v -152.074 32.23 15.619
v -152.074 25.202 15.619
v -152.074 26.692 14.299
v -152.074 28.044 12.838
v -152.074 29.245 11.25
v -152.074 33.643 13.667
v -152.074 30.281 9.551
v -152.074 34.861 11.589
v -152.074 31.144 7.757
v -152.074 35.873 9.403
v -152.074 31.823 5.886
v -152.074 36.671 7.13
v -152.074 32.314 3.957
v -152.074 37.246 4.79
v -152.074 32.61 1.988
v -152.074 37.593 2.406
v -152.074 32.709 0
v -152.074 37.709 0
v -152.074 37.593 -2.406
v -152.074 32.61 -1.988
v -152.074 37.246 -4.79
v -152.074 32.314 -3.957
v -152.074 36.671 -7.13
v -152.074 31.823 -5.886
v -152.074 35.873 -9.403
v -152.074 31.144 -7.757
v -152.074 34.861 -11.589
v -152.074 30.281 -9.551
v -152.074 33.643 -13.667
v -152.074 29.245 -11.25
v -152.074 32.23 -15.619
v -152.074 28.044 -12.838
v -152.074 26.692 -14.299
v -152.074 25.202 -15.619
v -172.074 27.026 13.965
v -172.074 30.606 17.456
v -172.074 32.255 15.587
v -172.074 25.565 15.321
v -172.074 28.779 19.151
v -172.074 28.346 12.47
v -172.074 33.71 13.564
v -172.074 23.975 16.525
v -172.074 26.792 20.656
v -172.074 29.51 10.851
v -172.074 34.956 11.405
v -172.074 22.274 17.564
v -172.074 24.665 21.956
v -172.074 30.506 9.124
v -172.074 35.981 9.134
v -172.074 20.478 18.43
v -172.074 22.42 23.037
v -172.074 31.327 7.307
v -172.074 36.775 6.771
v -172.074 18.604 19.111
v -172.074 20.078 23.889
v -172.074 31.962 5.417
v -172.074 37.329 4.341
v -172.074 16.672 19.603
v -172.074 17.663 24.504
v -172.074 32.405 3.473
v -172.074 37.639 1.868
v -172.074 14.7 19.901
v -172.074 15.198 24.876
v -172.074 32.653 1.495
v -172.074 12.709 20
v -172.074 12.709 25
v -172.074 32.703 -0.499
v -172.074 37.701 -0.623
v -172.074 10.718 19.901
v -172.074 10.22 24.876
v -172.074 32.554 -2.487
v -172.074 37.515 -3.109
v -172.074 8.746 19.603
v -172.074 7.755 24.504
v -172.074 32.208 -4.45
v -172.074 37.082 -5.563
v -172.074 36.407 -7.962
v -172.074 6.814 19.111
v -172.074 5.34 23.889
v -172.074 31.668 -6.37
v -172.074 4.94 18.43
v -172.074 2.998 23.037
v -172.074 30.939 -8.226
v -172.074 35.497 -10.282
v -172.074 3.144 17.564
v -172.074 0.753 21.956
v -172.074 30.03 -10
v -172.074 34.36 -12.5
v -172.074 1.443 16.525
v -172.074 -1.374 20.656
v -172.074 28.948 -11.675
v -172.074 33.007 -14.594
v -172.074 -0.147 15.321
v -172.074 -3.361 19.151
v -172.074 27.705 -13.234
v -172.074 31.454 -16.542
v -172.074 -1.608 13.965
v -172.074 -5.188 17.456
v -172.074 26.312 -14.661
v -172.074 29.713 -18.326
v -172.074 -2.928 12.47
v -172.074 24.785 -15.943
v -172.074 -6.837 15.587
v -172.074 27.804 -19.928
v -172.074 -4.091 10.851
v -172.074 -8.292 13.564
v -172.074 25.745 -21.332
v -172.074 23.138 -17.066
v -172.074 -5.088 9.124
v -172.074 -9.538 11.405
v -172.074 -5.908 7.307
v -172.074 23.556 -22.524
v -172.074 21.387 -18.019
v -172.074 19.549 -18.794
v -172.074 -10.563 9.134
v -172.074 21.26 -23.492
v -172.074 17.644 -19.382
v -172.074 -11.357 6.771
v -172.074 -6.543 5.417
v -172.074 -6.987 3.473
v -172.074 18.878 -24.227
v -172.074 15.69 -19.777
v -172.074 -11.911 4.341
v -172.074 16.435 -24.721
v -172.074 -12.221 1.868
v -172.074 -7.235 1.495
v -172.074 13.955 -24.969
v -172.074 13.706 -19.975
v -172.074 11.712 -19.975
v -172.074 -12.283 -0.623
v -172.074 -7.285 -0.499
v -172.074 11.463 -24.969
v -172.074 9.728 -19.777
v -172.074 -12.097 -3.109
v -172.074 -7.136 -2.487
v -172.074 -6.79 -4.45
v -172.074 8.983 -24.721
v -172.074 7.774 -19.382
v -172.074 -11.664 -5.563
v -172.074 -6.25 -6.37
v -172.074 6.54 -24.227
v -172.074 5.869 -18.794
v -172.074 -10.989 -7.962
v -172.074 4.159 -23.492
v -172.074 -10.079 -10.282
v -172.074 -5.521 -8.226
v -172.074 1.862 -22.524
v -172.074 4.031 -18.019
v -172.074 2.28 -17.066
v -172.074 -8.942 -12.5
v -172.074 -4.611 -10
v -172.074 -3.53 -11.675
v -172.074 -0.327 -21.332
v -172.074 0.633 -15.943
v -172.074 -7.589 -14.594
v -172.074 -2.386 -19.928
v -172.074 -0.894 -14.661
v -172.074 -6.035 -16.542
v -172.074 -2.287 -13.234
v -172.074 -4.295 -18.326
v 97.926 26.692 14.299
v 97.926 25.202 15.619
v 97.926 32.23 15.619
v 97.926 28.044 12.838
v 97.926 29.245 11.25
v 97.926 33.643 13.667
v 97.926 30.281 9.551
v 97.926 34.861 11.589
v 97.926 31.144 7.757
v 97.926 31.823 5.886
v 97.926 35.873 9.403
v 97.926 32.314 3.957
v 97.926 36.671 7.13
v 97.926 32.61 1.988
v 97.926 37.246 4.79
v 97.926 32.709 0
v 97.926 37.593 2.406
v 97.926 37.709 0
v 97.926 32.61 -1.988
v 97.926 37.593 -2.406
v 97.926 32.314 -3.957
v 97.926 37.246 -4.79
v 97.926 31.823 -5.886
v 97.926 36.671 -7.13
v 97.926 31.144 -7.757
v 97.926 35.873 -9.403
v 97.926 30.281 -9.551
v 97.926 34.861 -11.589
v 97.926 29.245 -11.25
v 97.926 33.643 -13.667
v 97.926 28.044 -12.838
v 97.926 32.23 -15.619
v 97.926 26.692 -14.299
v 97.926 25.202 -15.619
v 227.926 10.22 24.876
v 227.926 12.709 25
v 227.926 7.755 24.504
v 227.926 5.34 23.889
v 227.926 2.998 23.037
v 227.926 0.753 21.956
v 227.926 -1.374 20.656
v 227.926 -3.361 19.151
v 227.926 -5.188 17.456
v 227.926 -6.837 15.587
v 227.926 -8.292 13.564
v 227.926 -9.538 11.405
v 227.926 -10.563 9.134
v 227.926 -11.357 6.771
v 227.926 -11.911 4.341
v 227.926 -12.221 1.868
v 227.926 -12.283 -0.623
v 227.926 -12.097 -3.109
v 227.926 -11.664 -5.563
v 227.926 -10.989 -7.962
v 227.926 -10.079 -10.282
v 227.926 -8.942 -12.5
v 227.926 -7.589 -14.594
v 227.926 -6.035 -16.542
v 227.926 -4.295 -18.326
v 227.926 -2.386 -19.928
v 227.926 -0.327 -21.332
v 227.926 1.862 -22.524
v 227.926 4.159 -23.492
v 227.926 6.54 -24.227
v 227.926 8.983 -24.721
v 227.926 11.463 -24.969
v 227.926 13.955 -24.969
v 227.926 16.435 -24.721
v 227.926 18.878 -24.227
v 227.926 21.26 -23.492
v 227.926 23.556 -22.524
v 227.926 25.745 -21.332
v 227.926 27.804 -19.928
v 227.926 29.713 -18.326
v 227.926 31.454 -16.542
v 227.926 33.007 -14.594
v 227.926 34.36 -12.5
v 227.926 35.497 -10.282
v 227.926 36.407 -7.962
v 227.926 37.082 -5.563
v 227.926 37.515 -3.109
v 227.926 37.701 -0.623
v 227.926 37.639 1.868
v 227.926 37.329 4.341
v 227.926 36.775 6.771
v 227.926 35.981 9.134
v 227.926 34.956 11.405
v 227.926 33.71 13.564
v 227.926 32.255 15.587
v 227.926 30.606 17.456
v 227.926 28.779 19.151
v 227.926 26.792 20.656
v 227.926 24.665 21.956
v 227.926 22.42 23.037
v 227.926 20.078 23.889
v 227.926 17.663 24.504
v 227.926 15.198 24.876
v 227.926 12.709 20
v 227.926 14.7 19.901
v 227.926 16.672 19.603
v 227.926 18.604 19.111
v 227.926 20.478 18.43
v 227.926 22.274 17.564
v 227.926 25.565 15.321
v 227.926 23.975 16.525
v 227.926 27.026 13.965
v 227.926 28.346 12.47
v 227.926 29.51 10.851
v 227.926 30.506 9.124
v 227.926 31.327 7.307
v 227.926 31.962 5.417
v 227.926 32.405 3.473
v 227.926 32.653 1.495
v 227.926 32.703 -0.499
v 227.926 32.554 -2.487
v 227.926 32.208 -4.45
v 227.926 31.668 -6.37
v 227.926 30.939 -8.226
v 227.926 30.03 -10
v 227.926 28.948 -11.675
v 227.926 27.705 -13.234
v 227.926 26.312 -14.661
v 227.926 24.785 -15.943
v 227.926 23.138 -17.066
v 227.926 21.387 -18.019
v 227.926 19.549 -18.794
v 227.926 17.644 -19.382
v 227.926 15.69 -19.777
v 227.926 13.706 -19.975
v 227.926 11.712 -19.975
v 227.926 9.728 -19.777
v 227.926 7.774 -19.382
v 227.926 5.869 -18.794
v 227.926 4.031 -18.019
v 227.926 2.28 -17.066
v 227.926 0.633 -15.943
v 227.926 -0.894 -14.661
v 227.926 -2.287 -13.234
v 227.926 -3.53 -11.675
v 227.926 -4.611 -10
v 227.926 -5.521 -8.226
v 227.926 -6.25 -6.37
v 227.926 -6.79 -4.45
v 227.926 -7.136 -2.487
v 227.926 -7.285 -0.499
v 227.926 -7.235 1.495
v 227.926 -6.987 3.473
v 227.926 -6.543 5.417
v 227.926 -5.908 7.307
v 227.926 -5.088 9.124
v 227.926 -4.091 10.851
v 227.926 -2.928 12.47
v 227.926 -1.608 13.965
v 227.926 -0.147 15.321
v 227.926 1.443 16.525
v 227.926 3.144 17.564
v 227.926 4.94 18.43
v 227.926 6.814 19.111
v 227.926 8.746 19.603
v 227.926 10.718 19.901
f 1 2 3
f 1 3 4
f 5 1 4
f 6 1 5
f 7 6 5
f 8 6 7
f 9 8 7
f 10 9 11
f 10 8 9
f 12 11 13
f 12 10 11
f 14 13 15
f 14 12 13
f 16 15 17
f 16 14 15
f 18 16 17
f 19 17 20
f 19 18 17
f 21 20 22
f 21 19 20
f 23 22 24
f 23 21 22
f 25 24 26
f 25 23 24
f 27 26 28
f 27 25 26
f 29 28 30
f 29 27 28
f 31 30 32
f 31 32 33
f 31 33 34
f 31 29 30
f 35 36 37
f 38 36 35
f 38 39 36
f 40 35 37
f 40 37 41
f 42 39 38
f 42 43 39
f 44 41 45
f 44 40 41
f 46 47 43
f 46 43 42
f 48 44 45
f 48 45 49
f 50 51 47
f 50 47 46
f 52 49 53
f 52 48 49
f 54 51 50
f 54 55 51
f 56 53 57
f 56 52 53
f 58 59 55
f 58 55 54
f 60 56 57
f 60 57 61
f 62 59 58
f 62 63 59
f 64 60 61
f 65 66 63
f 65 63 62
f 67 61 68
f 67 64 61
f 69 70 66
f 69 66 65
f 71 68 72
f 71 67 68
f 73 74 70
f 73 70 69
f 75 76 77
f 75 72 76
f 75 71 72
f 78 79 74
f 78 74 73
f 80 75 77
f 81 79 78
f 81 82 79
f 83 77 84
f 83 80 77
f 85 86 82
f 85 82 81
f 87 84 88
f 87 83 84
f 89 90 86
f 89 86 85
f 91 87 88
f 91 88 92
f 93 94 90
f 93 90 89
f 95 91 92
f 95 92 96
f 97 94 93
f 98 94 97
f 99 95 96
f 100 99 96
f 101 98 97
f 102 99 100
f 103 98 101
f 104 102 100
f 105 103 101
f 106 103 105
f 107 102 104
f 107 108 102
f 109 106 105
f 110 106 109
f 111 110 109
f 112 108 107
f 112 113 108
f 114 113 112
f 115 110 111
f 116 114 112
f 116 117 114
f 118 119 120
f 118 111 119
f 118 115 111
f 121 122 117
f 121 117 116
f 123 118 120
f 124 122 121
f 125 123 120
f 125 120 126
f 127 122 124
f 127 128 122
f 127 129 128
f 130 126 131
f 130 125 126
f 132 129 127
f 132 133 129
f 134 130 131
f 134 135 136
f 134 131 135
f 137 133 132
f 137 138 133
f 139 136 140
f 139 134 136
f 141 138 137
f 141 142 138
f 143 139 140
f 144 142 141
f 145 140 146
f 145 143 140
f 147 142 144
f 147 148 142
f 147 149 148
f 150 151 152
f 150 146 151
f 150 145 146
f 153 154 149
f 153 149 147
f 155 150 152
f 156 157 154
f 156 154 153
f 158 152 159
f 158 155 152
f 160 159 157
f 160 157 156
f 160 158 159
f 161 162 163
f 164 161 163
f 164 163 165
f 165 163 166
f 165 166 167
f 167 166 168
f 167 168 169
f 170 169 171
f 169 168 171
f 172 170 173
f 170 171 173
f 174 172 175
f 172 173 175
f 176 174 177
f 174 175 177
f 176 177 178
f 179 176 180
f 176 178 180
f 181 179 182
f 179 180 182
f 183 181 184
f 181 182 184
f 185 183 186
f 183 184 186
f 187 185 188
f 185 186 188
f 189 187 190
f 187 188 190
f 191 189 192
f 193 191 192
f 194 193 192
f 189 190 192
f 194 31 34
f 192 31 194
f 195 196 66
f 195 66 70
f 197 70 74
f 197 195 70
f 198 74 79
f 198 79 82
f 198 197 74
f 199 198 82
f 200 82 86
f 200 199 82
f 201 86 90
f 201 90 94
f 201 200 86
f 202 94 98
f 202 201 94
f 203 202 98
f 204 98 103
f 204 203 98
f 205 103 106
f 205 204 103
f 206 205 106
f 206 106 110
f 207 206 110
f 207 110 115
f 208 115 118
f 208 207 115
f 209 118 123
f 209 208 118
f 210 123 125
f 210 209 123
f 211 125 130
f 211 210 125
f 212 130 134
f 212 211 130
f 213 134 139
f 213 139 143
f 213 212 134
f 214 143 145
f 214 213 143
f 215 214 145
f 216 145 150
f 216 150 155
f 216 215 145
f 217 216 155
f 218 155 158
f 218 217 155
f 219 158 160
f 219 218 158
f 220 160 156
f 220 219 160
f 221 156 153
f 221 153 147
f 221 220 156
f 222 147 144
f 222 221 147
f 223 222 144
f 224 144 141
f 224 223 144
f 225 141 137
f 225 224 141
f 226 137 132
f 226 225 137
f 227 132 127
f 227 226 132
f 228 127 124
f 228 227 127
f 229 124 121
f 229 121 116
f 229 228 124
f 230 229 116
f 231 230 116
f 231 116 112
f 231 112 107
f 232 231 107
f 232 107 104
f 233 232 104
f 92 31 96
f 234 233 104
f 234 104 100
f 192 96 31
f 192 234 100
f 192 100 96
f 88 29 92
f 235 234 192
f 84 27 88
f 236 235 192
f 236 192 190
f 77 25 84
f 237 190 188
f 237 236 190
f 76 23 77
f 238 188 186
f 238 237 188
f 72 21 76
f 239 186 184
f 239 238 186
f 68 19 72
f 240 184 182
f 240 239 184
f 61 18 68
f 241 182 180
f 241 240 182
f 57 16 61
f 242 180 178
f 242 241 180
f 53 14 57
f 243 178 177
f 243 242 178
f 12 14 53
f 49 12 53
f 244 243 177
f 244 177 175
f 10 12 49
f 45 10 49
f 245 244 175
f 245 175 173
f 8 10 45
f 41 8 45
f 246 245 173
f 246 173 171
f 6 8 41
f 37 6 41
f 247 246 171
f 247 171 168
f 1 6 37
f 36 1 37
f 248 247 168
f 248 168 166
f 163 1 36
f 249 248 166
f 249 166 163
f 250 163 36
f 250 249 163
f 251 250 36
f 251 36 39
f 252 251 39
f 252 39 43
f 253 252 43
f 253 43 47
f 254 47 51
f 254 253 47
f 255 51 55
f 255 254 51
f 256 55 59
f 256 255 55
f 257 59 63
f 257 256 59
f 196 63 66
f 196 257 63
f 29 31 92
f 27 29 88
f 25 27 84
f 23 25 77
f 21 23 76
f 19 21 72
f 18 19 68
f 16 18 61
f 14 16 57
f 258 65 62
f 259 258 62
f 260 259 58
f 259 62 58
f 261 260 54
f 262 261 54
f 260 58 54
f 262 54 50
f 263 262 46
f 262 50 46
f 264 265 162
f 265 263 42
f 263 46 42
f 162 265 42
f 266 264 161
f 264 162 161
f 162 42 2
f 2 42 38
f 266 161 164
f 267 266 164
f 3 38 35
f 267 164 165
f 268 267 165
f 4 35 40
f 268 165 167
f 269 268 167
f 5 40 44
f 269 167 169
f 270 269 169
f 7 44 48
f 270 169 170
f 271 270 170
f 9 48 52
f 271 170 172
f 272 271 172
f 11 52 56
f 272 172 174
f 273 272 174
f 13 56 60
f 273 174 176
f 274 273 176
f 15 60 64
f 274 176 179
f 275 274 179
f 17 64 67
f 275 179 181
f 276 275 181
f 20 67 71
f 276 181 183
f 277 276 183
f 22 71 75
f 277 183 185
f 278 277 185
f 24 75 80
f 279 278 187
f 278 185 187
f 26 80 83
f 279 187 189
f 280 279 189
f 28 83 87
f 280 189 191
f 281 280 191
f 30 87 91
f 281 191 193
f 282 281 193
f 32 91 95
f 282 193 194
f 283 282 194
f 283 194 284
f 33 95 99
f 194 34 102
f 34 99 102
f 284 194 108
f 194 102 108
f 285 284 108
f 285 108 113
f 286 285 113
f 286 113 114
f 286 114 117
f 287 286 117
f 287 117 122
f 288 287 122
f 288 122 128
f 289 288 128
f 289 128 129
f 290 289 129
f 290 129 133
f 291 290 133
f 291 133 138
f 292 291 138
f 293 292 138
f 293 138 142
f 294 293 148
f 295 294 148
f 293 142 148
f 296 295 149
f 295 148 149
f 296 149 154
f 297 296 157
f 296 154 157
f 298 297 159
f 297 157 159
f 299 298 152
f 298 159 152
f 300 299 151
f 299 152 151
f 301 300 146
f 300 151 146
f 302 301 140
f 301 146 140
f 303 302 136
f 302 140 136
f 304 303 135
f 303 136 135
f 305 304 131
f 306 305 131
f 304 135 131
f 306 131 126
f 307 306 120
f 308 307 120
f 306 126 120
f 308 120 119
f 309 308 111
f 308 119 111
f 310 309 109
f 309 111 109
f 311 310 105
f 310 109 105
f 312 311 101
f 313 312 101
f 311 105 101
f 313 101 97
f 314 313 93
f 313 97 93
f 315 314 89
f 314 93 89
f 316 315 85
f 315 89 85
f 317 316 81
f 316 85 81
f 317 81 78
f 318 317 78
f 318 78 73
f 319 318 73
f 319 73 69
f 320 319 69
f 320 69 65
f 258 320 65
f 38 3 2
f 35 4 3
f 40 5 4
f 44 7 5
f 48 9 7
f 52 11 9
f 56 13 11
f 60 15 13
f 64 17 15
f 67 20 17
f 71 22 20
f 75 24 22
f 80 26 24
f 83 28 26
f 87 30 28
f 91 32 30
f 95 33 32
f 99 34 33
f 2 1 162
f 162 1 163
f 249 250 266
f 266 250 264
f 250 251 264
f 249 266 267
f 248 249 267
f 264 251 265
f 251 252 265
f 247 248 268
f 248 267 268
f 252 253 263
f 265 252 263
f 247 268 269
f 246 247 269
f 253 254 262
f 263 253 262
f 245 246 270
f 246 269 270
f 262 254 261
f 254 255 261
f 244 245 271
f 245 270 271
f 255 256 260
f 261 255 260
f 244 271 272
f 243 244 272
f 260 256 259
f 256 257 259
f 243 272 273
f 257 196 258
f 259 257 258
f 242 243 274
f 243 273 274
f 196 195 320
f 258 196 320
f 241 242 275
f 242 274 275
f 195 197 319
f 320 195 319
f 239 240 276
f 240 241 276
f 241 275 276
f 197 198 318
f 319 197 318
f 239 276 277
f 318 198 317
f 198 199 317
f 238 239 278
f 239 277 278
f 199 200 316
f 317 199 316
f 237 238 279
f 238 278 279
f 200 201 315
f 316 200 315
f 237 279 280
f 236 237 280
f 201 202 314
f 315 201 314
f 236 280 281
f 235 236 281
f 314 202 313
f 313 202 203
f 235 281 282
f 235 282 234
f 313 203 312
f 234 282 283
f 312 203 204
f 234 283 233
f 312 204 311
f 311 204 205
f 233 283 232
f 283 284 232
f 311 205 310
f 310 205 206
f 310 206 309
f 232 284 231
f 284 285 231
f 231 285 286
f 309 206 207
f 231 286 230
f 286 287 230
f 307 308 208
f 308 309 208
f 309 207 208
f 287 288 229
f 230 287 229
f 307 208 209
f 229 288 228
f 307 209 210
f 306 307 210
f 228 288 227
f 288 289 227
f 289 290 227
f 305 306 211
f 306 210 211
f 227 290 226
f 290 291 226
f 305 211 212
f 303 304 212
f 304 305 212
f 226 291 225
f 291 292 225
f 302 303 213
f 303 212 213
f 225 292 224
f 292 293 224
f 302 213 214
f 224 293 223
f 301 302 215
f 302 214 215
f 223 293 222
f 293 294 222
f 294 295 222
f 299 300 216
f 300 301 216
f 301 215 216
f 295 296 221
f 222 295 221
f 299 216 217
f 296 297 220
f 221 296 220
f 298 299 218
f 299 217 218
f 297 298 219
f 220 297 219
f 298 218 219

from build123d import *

# Parameters (mm, degrees)
SKETCH3_W          = 400
SKETCH3_H          = 25
SKETCH5_R          = 20
CUT_EXTRUDE3_DEPTH = 403.550581854
SKETCH8_W          = 250
SKETCH8_H          = 31.237018092
CUT_EXTRUDE2_DEPTH = 78


with BuildPart() as part:
    # Sketch3 → Revolve1 (revolve)
    with BuildSketch(Plane.XY, mode=Mode.PRIVATE) as revolve1_sk:
        with Locations((27.926421405, 25.2090301)):
            Rectangle(SKETCH3_W, SKETCH3_H)
    revolve(revolve1_sk.sketch.rotate(Axis((-172.073578595, 12.7090301, 0), (1, 0, 0)), 90), axis=Axis((-172.073578595, 12.7090301, 0), (1, 0, 0)))

    # Sketch5 → Cut-Extrude3 (cut, through all)
    with BuildSketch(Plane.ZY.offset(172.073578595)):
        with Locations((0, 12.7090301)):
            Circle(SKETCH5_R)
    extrude(amount=-CUT_EXTRUDE3_DEPTH, mode=Mode.SUBTRACT)

    # Sketch8 → Cut-Extrude2 (cut)
    with BuildSketch(Plane(origin=(0, 100, 0), x_dir=(1, 0, 0), z_dir=(0, 1, 0))):
        with Locations((-27.073578595, 0)):
            Rectangle(SKETCH8_W, SKETCH8_H)
    extrude(amount=-CUT_EXTRUDE2_DEPTH, mode=Mode.SUBTRACT)


solid = part.part
